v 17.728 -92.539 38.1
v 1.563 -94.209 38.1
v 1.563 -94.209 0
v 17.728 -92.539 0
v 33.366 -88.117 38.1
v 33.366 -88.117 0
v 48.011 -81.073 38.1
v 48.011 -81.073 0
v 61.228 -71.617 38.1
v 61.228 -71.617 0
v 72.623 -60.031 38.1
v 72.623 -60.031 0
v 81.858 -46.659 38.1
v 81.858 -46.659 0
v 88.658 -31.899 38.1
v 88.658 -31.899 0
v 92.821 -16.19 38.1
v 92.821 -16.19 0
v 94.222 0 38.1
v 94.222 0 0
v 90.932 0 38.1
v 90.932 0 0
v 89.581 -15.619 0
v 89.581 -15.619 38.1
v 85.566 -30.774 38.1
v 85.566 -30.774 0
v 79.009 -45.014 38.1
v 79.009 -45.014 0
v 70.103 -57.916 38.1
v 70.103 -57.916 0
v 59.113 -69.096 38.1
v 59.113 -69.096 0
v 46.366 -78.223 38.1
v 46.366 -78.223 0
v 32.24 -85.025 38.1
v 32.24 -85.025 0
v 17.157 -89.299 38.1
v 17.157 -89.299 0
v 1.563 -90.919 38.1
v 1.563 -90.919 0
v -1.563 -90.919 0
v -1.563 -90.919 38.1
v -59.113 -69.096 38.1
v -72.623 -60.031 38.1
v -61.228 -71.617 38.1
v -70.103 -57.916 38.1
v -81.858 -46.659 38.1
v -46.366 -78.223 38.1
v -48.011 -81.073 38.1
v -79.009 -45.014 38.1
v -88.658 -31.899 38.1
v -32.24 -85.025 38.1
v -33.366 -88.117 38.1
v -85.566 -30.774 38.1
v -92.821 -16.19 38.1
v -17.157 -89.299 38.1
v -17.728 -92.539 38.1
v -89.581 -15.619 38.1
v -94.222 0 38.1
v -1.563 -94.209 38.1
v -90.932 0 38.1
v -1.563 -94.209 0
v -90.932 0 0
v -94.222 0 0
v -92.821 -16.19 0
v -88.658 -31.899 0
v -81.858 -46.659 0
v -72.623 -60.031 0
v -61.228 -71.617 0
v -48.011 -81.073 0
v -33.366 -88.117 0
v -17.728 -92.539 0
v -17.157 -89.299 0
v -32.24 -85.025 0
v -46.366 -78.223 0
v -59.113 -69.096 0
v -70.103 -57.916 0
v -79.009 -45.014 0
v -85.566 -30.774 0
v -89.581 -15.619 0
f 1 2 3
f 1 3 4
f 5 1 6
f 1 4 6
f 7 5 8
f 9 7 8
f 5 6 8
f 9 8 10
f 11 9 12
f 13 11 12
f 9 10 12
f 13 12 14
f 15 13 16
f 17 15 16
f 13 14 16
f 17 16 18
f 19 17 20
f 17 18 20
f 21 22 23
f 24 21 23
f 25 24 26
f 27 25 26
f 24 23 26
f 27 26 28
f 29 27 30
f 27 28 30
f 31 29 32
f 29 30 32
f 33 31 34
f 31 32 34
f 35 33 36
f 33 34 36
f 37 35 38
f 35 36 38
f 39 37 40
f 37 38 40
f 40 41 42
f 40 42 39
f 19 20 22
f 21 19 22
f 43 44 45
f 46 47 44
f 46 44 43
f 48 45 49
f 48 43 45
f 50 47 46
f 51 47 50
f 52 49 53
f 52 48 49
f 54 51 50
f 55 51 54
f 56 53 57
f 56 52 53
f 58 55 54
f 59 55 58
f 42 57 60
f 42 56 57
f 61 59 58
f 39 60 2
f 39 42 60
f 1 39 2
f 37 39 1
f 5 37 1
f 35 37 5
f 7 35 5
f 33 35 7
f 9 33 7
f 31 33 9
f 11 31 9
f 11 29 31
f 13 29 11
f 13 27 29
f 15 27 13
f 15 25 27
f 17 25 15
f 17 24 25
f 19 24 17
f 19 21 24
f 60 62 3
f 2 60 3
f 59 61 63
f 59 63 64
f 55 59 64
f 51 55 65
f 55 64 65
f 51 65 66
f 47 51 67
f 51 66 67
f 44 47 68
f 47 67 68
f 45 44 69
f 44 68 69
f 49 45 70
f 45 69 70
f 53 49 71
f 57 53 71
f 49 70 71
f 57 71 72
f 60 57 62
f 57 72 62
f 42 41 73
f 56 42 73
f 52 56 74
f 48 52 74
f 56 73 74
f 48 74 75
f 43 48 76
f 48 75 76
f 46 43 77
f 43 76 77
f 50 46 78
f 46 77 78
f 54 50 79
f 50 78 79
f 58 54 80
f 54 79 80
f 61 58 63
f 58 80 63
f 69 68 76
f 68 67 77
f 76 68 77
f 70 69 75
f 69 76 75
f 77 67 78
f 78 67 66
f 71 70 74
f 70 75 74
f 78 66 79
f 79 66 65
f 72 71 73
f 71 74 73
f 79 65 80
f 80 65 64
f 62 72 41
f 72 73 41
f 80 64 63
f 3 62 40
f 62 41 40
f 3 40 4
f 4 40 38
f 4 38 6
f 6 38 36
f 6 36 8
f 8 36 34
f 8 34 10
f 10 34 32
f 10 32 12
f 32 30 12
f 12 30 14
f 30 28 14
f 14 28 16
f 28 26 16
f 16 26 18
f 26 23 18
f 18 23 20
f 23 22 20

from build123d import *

# Parameters (mm, degrees)
F0_W     = 3.12686
F0_H     = 3.290719
F1_DEPTH = 38.1


with BuildPart() as f1:
    # F0 (on Top) → F1 (new body)
    with BuildSketch(Plane.XY):
        with BuildLine():
            Line((-90.932, 0), (-94.22225, 0))
            ThreePointArc((-94.22225, 0), (-67.175674, -66.070124), (-1.56343, -94.209278))
            Line((-1.56343, -94.209278), (-1.56343, -90.918559))
            ThreePointArc((-1.56343, -90.918559), (-64.849034, -63.743481), (-90.932, 0))
        make_face()
        with Locations((0, -92.563918)):
            Rectangle(F0_W, F0_H)
        with BuildLine():
            Line((1.56343, -90.918559), (1.56343, -94.209278))
            ThreePointArc((1.56343, -94.209278), (67.175674, -66.070124), (94.22225, 0))
            Line((94.22225, 0), (90.932, 0))
            ThreePointArc((90.932, 0), (64.849034, -63.743481), (1.56343, -90.918559))
        make_face()
    extrude(amount=F1_DEPTH)


solid = f1.part
